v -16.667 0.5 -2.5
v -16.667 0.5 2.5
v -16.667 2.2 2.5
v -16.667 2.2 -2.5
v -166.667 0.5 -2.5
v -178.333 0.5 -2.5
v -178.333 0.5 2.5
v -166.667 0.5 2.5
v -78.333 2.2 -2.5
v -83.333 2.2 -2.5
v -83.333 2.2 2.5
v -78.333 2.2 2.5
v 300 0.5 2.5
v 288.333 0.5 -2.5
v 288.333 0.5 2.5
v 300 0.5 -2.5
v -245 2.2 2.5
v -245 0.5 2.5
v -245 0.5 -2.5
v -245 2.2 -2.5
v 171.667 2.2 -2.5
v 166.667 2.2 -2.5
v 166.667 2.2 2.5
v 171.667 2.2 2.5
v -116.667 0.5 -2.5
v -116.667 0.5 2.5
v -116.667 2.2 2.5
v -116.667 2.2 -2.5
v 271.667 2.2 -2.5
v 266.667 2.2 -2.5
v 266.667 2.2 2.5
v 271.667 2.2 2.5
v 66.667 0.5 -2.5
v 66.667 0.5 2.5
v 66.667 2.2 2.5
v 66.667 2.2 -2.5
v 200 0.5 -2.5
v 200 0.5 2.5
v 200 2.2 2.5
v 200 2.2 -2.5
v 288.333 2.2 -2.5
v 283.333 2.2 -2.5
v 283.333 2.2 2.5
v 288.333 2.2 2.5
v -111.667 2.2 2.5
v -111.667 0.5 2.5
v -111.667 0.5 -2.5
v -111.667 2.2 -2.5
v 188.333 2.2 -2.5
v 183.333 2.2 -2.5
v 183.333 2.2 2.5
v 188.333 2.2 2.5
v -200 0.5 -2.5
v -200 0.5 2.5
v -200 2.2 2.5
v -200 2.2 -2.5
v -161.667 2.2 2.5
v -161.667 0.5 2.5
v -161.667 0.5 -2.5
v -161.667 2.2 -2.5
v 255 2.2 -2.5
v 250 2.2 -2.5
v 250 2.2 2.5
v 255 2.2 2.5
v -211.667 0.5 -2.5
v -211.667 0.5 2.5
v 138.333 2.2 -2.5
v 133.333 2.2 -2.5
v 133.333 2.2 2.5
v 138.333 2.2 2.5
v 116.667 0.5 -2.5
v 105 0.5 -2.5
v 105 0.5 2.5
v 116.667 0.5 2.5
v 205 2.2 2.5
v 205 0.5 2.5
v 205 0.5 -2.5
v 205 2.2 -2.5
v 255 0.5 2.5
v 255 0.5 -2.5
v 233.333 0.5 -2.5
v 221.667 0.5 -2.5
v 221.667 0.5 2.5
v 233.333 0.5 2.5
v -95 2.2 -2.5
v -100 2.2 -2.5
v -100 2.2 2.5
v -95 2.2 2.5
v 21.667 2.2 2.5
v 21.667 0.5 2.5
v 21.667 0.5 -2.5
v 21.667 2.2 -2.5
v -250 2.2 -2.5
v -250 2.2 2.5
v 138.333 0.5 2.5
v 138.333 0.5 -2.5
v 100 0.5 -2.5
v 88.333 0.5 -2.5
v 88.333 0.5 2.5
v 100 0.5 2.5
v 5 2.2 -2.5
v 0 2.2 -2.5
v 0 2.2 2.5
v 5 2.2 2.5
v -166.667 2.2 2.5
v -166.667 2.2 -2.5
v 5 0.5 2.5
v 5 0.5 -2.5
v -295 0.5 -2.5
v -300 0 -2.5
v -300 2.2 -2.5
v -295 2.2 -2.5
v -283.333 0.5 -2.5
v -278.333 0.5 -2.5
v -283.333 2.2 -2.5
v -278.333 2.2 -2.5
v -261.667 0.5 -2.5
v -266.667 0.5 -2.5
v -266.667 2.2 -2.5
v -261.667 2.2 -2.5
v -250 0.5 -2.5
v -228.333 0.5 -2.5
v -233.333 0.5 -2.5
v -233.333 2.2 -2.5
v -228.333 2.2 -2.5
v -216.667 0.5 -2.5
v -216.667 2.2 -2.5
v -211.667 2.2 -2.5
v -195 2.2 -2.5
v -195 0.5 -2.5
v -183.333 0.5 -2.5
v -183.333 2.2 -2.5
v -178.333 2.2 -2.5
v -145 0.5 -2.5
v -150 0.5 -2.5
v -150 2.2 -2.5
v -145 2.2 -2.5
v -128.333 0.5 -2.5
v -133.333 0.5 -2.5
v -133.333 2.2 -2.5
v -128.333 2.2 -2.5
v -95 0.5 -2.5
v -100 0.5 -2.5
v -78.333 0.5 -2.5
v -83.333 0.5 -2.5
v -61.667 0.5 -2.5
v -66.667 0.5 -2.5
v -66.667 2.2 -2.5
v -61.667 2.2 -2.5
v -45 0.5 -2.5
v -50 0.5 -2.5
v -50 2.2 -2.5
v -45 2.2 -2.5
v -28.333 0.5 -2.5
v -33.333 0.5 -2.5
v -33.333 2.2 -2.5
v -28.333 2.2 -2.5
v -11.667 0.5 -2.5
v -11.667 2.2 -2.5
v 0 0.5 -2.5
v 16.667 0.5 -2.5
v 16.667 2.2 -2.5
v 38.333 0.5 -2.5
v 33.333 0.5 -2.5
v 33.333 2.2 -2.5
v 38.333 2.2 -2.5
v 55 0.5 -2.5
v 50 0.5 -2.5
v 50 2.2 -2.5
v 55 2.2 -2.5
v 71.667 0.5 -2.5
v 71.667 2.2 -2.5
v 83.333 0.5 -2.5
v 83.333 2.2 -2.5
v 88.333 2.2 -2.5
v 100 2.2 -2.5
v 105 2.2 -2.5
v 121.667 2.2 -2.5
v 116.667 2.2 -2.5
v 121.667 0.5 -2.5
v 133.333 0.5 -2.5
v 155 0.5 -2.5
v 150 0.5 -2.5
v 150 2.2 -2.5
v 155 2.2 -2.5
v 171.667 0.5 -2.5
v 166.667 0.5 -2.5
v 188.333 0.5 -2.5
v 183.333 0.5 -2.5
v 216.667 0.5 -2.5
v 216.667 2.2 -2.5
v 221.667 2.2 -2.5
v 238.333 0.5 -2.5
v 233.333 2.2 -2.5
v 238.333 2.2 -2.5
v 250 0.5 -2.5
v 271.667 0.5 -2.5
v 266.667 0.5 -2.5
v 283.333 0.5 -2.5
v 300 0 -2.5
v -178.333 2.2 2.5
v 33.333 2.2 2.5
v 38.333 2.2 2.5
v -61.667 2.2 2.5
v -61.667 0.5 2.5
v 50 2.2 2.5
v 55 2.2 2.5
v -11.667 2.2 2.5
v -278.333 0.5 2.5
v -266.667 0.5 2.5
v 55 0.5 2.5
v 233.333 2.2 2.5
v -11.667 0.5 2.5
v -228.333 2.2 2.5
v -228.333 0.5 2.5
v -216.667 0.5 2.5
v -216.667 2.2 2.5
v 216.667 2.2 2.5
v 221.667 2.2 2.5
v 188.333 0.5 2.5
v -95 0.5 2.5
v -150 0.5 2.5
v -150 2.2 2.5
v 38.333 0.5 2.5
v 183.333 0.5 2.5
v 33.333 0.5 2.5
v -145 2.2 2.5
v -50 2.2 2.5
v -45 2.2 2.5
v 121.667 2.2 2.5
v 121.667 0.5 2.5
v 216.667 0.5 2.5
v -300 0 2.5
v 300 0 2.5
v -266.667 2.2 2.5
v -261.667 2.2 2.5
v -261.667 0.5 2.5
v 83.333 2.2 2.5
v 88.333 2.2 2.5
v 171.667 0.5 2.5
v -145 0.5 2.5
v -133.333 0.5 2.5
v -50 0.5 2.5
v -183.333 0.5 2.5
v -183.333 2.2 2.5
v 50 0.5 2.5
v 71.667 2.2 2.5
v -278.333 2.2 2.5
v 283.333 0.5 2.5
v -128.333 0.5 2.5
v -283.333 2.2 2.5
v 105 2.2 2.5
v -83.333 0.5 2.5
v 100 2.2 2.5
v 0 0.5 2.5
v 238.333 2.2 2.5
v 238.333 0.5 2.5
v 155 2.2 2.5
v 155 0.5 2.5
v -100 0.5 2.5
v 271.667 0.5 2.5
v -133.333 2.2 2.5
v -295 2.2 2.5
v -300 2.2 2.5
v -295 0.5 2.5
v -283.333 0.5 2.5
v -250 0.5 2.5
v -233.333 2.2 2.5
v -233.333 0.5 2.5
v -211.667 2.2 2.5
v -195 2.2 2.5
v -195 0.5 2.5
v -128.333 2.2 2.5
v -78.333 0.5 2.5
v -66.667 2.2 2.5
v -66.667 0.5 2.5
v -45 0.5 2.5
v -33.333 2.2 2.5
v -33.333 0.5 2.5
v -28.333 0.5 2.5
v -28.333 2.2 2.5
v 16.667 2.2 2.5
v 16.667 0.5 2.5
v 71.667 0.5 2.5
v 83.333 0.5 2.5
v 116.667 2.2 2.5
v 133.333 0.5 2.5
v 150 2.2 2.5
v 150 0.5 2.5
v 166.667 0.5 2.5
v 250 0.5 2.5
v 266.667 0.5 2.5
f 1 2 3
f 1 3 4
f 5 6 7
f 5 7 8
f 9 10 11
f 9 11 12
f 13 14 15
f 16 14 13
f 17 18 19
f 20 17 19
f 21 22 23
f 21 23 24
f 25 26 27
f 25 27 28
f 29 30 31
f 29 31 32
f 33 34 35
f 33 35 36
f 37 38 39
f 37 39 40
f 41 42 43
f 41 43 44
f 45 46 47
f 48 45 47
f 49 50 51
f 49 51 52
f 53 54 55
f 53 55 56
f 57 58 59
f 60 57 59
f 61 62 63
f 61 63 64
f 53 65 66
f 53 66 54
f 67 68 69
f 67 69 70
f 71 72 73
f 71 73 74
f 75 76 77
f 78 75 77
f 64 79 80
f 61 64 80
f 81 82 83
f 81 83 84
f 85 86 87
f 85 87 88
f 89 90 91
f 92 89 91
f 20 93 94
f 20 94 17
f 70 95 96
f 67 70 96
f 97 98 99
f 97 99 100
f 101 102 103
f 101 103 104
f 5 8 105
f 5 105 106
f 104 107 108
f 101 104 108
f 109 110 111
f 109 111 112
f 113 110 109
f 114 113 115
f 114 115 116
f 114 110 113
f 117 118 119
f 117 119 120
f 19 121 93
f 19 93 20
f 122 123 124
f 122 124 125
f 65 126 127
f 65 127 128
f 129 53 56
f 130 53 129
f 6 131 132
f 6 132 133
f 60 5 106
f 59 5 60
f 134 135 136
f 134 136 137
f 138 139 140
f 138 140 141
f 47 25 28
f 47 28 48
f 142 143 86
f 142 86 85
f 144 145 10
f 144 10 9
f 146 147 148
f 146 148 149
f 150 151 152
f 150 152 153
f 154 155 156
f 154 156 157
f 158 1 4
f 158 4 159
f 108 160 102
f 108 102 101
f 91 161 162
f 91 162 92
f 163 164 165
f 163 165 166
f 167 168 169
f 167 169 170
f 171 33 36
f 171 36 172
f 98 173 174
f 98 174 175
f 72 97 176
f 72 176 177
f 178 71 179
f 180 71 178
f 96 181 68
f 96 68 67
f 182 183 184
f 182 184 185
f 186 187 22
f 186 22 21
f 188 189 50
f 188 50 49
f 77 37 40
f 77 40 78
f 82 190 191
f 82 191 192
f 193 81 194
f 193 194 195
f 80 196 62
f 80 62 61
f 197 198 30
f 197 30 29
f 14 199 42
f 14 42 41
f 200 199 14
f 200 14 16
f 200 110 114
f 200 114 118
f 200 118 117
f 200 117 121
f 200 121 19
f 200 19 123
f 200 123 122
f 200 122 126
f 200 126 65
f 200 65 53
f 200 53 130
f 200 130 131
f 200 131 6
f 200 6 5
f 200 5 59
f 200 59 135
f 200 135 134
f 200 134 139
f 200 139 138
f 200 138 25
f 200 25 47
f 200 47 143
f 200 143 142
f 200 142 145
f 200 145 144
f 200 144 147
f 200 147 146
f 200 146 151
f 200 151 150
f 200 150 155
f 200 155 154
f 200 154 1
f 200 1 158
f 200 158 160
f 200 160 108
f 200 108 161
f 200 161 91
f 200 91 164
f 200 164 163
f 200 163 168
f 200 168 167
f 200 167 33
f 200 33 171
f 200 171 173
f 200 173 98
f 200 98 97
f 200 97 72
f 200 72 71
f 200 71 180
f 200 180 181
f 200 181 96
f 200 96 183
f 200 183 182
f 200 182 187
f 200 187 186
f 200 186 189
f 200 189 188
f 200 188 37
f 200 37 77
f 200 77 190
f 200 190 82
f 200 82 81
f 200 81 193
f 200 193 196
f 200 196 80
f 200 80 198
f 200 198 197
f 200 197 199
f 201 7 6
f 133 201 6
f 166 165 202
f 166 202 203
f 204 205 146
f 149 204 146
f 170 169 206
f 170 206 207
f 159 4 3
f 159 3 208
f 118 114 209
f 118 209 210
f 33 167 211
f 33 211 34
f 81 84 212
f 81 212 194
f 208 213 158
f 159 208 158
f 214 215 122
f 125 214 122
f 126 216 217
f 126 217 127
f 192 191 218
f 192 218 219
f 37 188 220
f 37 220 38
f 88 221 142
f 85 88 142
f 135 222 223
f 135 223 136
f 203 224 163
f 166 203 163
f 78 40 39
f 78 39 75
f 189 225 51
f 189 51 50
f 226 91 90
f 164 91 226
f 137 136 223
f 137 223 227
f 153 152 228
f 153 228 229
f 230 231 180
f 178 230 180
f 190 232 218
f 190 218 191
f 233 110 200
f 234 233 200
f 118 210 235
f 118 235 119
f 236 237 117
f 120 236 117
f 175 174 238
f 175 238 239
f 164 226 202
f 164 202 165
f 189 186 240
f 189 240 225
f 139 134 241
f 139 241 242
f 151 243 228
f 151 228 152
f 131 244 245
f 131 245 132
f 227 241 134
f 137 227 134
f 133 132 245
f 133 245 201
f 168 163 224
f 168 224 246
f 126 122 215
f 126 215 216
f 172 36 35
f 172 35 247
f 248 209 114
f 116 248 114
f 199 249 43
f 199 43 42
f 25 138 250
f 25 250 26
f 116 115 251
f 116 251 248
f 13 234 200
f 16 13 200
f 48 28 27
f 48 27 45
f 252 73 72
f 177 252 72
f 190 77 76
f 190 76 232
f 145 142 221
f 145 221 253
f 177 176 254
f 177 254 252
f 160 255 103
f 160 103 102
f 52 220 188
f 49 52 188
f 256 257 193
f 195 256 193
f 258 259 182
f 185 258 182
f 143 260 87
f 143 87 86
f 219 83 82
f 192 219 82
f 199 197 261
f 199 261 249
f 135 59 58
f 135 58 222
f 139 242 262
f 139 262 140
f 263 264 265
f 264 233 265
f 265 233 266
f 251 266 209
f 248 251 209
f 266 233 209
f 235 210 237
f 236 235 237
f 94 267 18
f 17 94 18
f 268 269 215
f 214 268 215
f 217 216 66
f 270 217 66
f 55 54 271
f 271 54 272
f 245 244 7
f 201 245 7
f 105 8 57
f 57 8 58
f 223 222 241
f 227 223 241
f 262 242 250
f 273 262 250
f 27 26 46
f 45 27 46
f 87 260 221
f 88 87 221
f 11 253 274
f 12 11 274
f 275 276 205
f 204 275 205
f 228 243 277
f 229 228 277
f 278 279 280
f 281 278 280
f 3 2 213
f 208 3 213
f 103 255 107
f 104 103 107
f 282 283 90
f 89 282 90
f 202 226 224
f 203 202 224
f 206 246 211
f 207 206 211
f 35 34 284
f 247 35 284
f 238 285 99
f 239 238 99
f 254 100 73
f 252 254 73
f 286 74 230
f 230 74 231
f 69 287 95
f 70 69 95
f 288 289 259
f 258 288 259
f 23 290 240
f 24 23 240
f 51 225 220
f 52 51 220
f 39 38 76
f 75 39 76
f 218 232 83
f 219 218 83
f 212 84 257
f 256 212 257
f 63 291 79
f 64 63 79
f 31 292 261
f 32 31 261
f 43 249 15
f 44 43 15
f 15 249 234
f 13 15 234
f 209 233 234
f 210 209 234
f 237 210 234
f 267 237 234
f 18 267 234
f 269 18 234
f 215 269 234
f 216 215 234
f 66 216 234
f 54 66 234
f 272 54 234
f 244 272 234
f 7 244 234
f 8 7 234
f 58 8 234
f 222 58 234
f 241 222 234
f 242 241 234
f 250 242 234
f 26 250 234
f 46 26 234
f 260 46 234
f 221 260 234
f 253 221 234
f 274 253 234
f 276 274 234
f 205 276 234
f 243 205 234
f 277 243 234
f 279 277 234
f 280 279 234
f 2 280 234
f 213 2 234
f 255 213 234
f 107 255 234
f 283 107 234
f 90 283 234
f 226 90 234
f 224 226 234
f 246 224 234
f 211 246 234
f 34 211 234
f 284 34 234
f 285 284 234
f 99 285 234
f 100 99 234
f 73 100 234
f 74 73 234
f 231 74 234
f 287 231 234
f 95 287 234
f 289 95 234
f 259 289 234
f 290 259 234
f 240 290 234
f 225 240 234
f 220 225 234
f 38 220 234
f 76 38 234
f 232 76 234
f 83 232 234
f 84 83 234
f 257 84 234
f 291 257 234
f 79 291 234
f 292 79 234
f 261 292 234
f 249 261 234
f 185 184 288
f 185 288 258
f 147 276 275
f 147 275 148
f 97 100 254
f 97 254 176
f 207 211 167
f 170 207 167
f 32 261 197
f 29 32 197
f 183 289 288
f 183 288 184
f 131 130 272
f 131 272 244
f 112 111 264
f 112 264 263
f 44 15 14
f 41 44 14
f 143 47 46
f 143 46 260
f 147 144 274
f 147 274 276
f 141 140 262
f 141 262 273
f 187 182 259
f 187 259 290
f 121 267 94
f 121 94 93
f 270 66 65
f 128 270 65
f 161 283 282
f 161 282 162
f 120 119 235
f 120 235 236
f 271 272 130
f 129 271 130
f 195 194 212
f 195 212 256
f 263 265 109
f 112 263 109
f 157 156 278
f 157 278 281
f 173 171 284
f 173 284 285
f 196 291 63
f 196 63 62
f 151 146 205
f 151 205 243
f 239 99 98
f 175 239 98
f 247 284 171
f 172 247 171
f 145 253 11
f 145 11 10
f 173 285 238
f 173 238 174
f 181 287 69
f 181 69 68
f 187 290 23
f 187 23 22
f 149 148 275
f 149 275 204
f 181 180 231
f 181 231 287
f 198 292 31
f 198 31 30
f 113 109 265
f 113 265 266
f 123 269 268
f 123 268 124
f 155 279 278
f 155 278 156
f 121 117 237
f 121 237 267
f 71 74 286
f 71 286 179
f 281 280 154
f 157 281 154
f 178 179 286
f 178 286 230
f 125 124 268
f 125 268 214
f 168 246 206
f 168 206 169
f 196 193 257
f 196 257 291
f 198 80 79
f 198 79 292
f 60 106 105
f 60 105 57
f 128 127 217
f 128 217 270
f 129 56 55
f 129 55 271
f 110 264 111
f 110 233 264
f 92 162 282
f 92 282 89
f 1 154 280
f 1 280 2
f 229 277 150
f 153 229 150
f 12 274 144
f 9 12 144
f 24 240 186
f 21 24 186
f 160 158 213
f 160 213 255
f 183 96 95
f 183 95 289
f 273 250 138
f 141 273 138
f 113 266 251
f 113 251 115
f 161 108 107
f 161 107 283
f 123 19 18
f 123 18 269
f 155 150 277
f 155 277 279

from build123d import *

# Parameters (mm, degrees)
SKETCH_1_W             = 600
SKETCH_1_H             = 5
EXTRUDE_1_DEPTH        = 0.5
SKETCH_2_W             = 5
SKETCH_2_H             = 5
EXTRUDE_2_DEPTH        = 1.7
PATTERN_LINEAR_1_COUNT = 36
PATTERN_LINEAR_1_PITCH = 16.666666667


with BuildPart() as part:
    # 草图1 → 凸台-拉伸1 (new body)
    with BuildSketch(Plane(origin=(0, 0, 0), x_dir=(1, 0, 0), z_dir=(0, 1, 0))):
        Rectangle(SKETCH_1_W, SKETCH_1_H)
    extrude(amount=EXTRUDE_1_DEPTH)

    # 草图2 → 凸台-拉伸2 (add)
    with BuildSketch(Plane(origin=(0, 0.5, 0), x_dir=(1, 0, 0), z_dir=(0, 1, 0))):
        with Locations((-297.5, 0)):
            Rectangle(SKETCH_2_W, SKETCH_2_H)
    extrude_2 = extrude(amount=EXTRUDE_2_DEPTH)

    # 阵列(线性)1: 凸台-拉伸2 ×36
    with Locations(*[(i * PATTERN_LINEAR_1_PITCH, 0, 0) for i in range(1, PATTERN_LINEAR_1_COUNT)]):
        add(extrude_2)


solid = part.part
